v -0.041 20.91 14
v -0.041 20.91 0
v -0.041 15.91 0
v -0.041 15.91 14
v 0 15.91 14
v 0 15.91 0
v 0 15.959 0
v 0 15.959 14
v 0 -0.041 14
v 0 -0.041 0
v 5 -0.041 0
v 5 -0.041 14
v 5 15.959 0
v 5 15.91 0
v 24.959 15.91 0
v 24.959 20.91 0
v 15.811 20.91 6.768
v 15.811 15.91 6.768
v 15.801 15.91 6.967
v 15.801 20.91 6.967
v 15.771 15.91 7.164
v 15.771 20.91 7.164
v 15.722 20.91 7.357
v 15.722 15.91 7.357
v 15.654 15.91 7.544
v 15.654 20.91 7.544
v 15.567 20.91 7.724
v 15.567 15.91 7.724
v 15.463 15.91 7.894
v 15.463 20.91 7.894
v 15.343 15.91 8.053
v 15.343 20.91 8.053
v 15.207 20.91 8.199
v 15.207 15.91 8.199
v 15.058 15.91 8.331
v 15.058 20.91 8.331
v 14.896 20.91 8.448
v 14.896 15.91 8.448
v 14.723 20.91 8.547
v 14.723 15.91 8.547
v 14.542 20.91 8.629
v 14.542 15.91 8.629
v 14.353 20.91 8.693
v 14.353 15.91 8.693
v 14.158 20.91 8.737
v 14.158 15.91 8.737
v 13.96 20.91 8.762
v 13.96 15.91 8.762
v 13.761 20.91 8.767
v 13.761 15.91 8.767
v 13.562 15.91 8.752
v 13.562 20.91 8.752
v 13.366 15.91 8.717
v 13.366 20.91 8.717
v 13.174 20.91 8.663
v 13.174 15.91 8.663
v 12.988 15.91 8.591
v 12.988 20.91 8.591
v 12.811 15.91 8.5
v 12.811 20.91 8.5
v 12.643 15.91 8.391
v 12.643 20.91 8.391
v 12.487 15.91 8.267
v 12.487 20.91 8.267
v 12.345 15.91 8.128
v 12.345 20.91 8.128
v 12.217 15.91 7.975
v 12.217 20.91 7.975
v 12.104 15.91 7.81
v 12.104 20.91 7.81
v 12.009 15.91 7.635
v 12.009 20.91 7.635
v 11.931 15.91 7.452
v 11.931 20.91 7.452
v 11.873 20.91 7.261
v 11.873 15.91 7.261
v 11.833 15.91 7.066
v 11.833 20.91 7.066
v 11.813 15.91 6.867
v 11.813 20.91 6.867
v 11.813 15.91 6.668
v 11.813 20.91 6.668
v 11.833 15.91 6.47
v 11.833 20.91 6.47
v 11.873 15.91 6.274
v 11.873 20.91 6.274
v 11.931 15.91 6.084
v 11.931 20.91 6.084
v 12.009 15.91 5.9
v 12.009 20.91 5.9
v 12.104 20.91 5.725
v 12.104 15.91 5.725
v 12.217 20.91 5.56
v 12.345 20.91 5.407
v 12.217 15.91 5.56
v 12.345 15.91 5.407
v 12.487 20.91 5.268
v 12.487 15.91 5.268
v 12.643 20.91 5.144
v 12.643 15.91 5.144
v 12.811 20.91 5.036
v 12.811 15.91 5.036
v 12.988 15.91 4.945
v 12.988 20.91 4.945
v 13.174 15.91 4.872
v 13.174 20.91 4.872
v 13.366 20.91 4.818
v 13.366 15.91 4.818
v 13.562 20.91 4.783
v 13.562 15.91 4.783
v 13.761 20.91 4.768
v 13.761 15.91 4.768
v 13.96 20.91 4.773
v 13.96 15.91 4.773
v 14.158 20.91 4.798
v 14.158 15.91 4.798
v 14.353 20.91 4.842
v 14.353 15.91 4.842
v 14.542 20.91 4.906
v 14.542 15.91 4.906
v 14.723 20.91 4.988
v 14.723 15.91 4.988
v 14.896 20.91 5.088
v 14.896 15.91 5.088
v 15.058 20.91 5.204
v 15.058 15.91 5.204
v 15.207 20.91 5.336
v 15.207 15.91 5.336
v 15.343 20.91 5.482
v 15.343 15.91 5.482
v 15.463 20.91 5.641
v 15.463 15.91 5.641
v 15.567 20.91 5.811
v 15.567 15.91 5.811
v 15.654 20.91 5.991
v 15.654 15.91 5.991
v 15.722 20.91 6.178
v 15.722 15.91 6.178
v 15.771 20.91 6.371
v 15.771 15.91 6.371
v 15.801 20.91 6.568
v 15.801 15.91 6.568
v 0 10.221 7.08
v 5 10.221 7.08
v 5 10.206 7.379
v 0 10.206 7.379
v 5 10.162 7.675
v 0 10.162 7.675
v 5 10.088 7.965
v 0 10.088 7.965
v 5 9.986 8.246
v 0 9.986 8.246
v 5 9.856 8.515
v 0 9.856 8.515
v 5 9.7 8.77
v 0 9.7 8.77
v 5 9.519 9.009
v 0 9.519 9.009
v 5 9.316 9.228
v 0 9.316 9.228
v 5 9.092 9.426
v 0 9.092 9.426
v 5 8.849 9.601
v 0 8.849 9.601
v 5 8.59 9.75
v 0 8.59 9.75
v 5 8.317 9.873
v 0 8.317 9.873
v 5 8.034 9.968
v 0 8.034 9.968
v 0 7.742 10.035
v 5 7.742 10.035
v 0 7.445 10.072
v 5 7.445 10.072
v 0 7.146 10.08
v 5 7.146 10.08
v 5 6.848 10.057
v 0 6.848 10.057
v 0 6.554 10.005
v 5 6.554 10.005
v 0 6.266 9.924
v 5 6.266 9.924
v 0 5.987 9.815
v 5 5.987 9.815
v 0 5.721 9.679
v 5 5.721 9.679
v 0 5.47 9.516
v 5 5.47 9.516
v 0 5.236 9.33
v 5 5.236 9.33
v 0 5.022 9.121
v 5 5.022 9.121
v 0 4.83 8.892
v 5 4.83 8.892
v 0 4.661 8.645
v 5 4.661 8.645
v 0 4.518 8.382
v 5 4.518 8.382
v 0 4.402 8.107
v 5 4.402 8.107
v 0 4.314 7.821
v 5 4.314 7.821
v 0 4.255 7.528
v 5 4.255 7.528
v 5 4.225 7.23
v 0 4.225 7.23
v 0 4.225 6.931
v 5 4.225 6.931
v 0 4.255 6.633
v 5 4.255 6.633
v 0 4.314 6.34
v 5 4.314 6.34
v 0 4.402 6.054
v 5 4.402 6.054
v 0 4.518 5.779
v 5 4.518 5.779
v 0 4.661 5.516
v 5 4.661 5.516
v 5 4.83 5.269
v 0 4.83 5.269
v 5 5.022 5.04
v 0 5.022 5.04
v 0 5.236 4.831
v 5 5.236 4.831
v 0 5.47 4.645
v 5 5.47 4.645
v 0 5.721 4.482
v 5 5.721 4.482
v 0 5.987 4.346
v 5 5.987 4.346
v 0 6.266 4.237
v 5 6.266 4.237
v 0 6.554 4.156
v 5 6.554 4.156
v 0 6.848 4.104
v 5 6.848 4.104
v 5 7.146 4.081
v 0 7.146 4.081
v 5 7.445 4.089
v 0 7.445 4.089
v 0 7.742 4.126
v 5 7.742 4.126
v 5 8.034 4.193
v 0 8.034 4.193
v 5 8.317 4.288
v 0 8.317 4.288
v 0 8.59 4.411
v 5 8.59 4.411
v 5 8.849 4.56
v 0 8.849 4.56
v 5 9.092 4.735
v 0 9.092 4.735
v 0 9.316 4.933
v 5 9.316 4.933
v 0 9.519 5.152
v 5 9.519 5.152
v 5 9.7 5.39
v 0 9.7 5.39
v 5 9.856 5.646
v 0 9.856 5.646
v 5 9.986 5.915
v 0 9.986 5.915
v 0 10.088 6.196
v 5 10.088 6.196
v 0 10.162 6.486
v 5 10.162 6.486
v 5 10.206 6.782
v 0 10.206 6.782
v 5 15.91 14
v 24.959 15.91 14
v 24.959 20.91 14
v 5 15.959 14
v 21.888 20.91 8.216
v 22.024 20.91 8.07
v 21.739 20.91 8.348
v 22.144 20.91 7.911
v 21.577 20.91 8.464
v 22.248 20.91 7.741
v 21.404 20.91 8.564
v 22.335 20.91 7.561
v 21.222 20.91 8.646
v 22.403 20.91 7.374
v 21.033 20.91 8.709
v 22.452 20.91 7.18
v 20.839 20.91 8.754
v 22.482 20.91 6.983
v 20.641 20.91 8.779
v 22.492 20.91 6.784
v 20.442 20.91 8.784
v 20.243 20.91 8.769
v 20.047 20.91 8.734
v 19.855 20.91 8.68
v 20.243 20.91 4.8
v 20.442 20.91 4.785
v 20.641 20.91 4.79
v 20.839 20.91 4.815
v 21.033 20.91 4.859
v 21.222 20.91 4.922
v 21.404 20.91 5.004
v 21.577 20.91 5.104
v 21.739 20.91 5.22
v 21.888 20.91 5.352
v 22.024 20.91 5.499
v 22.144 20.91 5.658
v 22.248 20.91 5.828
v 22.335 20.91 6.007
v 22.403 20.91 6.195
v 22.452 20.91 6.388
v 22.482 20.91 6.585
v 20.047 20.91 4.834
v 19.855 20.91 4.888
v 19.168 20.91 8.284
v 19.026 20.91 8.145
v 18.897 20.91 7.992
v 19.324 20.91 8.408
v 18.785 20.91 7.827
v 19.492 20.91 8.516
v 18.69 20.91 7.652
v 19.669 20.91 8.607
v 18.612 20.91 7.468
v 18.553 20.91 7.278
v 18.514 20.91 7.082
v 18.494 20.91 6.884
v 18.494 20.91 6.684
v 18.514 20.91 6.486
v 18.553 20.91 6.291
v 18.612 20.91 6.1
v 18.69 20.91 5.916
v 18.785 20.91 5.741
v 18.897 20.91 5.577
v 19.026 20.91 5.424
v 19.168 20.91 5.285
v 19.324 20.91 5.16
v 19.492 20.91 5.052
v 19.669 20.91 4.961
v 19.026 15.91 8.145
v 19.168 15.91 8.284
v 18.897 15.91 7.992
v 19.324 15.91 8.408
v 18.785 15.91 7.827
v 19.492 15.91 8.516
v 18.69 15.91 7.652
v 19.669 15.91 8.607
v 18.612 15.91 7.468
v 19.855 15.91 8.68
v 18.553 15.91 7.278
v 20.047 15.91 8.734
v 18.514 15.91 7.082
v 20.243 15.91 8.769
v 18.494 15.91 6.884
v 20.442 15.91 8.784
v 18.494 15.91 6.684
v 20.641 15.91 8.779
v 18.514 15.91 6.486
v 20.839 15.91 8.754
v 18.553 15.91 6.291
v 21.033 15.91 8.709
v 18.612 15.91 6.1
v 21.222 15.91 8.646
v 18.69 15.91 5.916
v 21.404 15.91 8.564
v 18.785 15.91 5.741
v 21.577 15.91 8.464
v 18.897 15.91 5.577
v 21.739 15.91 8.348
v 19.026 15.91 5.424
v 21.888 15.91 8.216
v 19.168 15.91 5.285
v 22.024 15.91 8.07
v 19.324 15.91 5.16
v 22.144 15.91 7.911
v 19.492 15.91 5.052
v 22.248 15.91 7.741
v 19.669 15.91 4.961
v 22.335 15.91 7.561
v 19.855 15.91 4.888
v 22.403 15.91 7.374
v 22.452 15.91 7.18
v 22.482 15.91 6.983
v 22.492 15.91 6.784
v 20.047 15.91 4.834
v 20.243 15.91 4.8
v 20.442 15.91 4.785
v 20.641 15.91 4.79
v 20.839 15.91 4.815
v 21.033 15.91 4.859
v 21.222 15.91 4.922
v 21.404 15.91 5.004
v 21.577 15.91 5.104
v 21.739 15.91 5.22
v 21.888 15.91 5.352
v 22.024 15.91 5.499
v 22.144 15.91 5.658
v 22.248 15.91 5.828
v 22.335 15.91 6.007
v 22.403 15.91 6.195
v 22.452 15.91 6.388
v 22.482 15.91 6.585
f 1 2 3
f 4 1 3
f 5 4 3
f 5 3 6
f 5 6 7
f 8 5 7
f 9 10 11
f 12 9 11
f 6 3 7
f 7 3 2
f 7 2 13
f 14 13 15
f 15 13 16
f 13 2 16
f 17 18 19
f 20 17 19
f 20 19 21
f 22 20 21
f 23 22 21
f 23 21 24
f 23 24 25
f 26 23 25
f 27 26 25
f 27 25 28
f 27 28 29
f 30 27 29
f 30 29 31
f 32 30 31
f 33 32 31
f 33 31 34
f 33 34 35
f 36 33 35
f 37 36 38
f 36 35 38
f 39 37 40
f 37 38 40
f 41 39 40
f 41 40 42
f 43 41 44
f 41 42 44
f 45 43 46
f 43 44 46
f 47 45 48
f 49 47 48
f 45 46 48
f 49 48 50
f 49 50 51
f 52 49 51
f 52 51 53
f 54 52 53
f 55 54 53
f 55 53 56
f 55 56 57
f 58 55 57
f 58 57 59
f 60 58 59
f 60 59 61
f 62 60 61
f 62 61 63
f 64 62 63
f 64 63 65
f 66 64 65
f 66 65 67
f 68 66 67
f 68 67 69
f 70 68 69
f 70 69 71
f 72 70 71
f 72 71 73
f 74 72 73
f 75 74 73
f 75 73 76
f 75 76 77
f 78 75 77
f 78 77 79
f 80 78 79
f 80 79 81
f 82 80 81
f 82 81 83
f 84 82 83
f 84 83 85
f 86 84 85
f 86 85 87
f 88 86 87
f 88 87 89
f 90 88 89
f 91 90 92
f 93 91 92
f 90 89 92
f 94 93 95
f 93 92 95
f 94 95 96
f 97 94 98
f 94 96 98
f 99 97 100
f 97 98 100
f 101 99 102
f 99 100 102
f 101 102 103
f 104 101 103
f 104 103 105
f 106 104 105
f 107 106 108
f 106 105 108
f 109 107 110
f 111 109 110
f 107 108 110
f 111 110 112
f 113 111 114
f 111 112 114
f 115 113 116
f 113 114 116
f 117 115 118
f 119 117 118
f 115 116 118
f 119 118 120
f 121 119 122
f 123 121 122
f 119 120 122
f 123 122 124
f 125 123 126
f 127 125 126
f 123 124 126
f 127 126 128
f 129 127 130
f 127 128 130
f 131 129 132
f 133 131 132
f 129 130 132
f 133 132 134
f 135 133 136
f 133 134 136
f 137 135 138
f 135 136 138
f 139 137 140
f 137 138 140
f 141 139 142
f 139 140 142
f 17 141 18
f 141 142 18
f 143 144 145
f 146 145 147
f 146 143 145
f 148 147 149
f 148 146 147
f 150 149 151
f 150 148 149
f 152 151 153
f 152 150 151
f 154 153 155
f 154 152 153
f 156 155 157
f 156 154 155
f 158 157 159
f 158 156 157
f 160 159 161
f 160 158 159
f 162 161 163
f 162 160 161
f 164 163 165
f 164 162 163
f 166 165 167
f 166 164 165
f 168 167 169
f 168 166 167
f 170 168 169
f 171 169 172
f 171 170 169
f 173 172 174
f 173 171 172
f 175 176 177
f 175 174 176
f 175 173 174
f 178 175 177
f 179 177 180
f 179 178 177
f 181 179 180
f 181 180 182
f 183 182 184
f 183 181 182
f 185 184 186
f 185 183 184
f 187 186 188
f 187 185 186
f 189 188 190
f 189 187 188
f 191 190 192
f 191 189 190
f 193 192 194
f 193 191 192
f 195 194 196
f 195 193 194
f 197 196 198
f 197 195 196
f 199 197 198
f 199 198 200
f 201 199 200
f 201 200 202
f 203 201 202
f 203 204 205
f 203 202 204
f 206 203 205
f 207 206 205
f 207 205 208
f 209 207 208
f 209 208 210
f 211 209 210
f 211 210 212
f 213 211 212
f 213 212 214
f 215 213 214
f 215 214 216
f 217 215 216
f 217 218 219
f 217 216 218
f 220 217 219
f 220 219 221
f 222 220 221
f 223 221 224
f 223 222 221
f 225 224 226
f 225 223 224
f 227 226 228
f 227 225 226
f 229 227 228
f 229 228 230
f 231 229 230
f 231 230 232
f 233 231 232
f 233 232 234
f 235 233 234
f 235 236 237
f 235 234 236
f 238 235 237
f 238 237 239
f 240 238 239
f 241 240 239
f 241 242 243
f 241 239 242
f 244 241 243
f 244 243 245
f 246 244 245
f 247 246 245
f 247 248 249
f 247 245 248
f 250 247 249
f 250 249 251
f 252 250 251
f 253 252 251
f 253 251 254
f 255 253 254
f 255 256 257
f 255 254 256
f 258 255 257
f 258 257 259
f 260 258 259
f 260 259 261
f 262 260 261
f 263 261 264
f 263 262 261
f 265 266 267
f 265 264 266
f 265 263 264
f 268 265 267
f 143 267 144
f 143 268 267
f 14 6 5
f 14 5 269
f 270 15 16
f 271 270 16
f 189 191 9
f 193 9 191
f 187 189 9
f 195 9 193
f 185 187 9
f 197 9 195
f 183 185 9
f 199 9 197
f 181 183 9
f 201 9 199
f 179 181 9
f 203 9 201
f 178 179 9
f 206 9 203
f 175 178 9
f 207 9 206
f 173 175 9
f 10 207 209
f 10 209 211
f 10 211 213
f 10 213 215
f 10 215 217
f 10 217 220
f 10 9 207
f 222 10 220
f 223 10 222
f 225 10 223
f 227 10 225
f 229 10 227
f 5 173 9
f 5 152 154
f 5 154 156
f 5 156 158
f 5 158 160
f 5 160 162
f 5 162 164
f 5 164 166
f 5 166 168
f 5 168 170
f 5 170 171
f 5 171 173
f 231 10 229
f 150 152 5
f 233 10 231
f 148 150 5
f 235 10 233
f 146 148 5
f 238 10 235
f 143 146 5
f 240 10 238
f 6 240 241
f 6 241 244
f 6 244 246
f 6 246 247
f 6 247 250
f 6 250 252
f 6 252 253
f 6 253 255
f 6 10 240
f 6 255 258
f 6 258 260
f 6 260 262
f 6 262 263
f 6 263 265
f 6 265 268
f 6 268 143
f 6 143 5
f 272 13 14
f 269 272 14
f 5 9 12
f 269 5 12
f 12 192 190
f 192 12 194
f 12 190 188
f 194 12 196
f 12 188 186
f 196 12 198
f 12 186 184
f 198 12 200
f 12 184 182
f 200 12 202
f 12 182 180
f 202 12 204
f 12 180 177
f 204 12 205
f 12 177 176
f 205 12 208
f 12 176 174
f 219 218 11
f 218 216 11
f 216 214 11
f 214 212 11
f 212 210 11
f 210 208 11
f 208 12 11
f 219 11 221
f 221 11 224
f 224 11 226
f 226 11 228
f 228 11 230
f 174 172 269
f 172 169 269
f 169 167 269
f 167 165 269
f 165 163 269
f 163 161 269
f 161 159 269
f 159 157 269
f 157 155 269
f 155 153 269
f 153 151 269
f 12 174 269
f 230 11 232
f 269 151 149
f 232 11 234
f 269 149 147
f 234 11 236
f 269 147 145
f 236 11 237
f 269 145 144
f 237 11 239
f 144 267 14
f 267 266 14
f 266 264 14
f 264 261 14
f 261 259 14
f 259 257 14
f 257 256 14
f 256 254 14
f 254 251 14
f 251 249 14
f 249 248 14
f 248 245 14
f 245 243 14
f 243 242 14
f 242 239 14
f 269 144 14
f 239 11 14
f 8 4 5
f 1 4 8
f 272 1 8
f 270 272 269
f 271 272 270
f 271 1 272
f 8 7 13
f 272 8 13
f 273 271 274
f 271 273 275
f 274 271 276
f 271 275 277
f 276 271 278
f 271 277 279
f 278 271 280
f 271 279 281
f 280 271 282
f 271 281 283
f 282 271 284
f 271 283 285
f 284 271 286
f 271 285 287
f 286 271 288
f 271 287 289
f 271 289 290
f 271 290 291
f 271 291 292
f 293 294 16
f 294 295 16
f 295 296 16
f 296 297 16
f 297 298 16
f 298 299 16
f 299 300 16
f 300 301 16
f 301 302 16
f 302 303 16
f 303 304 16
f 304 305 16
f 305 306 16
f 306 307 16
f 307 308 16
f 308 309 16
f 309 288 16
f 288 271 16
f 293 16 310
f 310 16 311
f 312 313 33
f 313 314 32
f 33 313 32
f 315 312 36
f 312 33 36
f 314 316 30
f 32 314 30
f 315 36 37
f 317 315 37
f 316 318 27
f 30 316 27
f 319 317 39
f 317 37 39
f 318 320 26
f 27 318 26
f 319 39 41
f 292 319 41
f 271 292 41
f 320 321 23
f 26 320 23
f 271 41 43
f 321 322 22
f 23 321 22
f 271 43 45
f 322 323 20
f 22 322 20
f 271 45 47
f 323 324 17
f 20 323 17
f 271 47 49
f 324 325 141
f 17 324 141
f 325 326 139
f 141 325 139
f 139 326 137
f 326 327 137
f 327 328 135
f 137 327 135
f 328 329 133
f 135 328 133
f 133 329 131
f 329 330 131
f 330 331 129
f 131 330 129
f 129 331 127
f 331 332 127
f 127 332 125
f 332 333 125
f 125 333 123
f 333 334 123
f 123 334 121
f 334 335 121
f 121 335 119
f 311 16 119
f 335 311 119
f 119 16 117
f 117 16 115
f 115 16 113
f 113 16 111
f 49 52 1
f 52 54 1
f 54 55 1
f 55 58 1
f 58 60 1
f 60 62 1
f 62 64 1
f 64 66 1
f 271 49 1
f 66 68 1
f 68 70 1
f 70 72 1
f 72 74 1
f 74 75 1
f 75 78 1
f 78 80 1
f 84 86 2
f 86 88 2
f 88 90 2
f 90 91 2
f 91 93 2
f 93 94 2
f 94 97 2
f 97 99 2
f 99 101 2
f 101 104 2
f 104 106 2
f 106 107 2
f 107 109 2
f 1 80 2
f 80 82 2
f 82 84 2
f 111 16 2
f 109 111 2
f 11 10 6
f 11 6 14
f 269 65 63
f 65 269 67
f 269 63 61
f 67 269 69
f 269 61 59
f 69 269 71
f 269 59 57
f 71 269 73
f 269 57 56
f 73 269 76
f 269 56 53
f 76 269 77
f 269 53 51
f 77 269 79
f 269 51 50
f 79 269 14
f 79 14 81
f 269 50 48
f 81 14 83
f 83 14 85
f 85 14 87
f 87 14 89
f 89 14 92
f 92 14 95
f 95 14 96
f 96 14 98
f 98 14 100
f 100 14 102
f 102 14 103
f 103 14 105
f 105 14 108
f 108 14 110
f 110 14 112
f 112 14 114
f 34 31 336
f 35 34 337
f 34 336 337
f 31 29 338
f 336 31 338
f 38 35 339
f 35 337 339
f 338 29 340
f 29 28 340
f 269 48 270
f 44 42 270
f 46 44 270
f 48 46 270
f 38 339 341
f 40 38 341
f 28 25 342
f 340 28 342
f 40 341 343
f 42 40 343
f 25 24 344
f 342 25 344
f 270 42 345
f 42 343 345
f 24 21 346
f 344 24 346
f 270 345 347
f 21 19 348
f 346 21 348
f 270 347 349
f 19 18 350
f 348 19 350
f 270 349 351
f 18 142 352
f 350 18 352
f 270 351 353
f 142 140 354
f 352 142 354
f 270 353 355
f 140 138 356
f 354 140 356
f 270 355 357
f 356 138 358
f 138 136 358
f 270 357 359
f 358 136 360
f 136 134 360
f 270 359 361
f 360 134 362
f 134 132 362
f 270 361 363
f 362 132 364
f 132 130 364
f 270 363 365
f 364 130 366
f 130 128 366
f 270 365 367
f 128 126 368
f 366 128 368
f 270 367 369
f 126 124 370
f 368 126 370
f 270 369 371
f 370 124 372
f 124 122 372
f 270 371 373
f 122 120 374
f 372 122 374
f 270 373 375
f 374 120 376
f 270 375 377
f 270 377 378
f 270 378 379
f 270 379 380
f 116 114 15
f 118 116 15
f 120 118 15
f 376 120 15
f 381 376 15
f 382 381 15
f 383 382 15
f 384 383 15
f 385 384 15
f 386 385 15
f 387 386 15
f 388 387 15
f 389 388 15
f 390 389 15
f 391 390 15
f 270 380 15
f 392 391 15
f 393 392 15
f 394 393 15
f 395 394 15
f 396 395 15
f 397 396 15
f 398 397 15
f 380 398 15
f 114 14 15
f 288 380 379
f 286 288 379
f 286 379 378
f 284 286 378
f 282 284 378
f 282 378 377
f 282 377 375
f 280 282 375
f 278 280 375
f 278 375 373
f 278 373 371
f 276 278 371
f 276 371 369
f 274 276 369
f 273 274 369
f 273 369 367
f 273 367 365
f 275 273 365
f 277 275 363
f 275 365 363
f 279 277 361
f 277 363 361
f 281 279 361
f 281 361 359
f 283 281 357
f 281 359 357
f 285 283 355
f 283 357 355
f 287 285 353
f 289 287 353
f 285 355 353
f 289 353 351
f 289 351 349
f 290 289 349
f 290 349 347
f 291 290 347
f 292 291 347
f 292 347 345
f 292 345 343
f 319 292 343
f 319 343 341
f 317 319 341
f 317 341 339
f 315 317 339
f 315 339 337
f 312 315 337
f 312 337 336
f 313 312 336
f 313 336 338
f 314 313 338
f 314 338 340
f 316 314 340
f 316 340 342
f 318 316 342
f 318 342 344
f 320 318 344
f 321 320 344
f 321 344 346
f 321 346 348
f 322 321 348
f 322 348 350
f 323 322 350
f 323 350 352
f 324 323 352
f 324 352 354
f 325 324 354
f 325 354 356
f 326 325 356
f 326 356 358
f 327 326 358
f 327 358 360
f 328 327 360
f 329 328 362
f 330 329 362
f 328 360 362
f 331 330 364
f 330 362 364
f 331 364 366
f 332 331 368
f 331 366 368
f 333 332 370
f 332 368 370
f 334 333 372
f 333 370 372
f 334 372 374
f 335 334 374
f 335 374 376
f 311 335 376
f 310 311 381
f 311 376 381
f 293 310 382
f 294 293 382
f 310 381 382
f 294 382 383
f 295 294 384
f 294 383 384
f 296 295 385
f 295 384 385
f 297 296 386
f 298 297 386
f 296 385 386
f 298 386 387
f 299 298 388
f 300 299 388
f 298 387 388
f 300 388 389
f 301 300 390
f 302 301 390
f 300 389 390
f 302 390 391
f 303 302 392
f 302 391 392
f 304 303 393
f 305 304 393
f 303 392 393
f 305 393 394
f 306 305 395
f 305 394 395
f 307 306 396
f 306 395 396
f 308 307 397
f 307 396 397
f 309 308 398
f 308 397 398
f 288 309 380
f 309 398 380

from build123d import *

# Parameters (mm, degrees)
F0_W     = 5
F0_H     = 15.950239
F1_DEPTH = 14
F2_R     = 3
F3_DEPTH = 9.3
F4_R     = 2
F5_DEPTH = 25


with BuildPart() as f1:
    # F0 (on Top) → F1 (new body)
    with BuildSketch(Plane.XY):
        Polygon((0, 15.909543), (0, 15.959304), (5, 15.959304), (5, 15.909543), (24.959307, 15.909543), (24.959307, 20.909543), (-0.040693, 20.909543), (-0.040693, 15.909543), align=None)
        with Locations((2.5, 7.934423)):
            Rectangle(F0_W, F0_H)
    extrude(amount=F1_DEPTH)

    # F2 (on Right) → F3 (cut)
    with BuildSketch(Plane.YZ):
        with Locations((7.221185, 7.080455)):
            Circle(F2_R)
    extrude(amount=F3_DEPTH, mode=Mode.SUBTRACT)

    # F4 (on Front) → F5 (cut)
    with BuildSketch(Plane.XZ):
        with Locations((13.81083, 6.767617)):
            Circle(F4_R)
        with Locations((20.491616, 6.784157)):
            Circle(F4_R)
    extrude(amount=-F5_DEPTH, mode=Mode.SUBTRACT)


solid = f1.part
